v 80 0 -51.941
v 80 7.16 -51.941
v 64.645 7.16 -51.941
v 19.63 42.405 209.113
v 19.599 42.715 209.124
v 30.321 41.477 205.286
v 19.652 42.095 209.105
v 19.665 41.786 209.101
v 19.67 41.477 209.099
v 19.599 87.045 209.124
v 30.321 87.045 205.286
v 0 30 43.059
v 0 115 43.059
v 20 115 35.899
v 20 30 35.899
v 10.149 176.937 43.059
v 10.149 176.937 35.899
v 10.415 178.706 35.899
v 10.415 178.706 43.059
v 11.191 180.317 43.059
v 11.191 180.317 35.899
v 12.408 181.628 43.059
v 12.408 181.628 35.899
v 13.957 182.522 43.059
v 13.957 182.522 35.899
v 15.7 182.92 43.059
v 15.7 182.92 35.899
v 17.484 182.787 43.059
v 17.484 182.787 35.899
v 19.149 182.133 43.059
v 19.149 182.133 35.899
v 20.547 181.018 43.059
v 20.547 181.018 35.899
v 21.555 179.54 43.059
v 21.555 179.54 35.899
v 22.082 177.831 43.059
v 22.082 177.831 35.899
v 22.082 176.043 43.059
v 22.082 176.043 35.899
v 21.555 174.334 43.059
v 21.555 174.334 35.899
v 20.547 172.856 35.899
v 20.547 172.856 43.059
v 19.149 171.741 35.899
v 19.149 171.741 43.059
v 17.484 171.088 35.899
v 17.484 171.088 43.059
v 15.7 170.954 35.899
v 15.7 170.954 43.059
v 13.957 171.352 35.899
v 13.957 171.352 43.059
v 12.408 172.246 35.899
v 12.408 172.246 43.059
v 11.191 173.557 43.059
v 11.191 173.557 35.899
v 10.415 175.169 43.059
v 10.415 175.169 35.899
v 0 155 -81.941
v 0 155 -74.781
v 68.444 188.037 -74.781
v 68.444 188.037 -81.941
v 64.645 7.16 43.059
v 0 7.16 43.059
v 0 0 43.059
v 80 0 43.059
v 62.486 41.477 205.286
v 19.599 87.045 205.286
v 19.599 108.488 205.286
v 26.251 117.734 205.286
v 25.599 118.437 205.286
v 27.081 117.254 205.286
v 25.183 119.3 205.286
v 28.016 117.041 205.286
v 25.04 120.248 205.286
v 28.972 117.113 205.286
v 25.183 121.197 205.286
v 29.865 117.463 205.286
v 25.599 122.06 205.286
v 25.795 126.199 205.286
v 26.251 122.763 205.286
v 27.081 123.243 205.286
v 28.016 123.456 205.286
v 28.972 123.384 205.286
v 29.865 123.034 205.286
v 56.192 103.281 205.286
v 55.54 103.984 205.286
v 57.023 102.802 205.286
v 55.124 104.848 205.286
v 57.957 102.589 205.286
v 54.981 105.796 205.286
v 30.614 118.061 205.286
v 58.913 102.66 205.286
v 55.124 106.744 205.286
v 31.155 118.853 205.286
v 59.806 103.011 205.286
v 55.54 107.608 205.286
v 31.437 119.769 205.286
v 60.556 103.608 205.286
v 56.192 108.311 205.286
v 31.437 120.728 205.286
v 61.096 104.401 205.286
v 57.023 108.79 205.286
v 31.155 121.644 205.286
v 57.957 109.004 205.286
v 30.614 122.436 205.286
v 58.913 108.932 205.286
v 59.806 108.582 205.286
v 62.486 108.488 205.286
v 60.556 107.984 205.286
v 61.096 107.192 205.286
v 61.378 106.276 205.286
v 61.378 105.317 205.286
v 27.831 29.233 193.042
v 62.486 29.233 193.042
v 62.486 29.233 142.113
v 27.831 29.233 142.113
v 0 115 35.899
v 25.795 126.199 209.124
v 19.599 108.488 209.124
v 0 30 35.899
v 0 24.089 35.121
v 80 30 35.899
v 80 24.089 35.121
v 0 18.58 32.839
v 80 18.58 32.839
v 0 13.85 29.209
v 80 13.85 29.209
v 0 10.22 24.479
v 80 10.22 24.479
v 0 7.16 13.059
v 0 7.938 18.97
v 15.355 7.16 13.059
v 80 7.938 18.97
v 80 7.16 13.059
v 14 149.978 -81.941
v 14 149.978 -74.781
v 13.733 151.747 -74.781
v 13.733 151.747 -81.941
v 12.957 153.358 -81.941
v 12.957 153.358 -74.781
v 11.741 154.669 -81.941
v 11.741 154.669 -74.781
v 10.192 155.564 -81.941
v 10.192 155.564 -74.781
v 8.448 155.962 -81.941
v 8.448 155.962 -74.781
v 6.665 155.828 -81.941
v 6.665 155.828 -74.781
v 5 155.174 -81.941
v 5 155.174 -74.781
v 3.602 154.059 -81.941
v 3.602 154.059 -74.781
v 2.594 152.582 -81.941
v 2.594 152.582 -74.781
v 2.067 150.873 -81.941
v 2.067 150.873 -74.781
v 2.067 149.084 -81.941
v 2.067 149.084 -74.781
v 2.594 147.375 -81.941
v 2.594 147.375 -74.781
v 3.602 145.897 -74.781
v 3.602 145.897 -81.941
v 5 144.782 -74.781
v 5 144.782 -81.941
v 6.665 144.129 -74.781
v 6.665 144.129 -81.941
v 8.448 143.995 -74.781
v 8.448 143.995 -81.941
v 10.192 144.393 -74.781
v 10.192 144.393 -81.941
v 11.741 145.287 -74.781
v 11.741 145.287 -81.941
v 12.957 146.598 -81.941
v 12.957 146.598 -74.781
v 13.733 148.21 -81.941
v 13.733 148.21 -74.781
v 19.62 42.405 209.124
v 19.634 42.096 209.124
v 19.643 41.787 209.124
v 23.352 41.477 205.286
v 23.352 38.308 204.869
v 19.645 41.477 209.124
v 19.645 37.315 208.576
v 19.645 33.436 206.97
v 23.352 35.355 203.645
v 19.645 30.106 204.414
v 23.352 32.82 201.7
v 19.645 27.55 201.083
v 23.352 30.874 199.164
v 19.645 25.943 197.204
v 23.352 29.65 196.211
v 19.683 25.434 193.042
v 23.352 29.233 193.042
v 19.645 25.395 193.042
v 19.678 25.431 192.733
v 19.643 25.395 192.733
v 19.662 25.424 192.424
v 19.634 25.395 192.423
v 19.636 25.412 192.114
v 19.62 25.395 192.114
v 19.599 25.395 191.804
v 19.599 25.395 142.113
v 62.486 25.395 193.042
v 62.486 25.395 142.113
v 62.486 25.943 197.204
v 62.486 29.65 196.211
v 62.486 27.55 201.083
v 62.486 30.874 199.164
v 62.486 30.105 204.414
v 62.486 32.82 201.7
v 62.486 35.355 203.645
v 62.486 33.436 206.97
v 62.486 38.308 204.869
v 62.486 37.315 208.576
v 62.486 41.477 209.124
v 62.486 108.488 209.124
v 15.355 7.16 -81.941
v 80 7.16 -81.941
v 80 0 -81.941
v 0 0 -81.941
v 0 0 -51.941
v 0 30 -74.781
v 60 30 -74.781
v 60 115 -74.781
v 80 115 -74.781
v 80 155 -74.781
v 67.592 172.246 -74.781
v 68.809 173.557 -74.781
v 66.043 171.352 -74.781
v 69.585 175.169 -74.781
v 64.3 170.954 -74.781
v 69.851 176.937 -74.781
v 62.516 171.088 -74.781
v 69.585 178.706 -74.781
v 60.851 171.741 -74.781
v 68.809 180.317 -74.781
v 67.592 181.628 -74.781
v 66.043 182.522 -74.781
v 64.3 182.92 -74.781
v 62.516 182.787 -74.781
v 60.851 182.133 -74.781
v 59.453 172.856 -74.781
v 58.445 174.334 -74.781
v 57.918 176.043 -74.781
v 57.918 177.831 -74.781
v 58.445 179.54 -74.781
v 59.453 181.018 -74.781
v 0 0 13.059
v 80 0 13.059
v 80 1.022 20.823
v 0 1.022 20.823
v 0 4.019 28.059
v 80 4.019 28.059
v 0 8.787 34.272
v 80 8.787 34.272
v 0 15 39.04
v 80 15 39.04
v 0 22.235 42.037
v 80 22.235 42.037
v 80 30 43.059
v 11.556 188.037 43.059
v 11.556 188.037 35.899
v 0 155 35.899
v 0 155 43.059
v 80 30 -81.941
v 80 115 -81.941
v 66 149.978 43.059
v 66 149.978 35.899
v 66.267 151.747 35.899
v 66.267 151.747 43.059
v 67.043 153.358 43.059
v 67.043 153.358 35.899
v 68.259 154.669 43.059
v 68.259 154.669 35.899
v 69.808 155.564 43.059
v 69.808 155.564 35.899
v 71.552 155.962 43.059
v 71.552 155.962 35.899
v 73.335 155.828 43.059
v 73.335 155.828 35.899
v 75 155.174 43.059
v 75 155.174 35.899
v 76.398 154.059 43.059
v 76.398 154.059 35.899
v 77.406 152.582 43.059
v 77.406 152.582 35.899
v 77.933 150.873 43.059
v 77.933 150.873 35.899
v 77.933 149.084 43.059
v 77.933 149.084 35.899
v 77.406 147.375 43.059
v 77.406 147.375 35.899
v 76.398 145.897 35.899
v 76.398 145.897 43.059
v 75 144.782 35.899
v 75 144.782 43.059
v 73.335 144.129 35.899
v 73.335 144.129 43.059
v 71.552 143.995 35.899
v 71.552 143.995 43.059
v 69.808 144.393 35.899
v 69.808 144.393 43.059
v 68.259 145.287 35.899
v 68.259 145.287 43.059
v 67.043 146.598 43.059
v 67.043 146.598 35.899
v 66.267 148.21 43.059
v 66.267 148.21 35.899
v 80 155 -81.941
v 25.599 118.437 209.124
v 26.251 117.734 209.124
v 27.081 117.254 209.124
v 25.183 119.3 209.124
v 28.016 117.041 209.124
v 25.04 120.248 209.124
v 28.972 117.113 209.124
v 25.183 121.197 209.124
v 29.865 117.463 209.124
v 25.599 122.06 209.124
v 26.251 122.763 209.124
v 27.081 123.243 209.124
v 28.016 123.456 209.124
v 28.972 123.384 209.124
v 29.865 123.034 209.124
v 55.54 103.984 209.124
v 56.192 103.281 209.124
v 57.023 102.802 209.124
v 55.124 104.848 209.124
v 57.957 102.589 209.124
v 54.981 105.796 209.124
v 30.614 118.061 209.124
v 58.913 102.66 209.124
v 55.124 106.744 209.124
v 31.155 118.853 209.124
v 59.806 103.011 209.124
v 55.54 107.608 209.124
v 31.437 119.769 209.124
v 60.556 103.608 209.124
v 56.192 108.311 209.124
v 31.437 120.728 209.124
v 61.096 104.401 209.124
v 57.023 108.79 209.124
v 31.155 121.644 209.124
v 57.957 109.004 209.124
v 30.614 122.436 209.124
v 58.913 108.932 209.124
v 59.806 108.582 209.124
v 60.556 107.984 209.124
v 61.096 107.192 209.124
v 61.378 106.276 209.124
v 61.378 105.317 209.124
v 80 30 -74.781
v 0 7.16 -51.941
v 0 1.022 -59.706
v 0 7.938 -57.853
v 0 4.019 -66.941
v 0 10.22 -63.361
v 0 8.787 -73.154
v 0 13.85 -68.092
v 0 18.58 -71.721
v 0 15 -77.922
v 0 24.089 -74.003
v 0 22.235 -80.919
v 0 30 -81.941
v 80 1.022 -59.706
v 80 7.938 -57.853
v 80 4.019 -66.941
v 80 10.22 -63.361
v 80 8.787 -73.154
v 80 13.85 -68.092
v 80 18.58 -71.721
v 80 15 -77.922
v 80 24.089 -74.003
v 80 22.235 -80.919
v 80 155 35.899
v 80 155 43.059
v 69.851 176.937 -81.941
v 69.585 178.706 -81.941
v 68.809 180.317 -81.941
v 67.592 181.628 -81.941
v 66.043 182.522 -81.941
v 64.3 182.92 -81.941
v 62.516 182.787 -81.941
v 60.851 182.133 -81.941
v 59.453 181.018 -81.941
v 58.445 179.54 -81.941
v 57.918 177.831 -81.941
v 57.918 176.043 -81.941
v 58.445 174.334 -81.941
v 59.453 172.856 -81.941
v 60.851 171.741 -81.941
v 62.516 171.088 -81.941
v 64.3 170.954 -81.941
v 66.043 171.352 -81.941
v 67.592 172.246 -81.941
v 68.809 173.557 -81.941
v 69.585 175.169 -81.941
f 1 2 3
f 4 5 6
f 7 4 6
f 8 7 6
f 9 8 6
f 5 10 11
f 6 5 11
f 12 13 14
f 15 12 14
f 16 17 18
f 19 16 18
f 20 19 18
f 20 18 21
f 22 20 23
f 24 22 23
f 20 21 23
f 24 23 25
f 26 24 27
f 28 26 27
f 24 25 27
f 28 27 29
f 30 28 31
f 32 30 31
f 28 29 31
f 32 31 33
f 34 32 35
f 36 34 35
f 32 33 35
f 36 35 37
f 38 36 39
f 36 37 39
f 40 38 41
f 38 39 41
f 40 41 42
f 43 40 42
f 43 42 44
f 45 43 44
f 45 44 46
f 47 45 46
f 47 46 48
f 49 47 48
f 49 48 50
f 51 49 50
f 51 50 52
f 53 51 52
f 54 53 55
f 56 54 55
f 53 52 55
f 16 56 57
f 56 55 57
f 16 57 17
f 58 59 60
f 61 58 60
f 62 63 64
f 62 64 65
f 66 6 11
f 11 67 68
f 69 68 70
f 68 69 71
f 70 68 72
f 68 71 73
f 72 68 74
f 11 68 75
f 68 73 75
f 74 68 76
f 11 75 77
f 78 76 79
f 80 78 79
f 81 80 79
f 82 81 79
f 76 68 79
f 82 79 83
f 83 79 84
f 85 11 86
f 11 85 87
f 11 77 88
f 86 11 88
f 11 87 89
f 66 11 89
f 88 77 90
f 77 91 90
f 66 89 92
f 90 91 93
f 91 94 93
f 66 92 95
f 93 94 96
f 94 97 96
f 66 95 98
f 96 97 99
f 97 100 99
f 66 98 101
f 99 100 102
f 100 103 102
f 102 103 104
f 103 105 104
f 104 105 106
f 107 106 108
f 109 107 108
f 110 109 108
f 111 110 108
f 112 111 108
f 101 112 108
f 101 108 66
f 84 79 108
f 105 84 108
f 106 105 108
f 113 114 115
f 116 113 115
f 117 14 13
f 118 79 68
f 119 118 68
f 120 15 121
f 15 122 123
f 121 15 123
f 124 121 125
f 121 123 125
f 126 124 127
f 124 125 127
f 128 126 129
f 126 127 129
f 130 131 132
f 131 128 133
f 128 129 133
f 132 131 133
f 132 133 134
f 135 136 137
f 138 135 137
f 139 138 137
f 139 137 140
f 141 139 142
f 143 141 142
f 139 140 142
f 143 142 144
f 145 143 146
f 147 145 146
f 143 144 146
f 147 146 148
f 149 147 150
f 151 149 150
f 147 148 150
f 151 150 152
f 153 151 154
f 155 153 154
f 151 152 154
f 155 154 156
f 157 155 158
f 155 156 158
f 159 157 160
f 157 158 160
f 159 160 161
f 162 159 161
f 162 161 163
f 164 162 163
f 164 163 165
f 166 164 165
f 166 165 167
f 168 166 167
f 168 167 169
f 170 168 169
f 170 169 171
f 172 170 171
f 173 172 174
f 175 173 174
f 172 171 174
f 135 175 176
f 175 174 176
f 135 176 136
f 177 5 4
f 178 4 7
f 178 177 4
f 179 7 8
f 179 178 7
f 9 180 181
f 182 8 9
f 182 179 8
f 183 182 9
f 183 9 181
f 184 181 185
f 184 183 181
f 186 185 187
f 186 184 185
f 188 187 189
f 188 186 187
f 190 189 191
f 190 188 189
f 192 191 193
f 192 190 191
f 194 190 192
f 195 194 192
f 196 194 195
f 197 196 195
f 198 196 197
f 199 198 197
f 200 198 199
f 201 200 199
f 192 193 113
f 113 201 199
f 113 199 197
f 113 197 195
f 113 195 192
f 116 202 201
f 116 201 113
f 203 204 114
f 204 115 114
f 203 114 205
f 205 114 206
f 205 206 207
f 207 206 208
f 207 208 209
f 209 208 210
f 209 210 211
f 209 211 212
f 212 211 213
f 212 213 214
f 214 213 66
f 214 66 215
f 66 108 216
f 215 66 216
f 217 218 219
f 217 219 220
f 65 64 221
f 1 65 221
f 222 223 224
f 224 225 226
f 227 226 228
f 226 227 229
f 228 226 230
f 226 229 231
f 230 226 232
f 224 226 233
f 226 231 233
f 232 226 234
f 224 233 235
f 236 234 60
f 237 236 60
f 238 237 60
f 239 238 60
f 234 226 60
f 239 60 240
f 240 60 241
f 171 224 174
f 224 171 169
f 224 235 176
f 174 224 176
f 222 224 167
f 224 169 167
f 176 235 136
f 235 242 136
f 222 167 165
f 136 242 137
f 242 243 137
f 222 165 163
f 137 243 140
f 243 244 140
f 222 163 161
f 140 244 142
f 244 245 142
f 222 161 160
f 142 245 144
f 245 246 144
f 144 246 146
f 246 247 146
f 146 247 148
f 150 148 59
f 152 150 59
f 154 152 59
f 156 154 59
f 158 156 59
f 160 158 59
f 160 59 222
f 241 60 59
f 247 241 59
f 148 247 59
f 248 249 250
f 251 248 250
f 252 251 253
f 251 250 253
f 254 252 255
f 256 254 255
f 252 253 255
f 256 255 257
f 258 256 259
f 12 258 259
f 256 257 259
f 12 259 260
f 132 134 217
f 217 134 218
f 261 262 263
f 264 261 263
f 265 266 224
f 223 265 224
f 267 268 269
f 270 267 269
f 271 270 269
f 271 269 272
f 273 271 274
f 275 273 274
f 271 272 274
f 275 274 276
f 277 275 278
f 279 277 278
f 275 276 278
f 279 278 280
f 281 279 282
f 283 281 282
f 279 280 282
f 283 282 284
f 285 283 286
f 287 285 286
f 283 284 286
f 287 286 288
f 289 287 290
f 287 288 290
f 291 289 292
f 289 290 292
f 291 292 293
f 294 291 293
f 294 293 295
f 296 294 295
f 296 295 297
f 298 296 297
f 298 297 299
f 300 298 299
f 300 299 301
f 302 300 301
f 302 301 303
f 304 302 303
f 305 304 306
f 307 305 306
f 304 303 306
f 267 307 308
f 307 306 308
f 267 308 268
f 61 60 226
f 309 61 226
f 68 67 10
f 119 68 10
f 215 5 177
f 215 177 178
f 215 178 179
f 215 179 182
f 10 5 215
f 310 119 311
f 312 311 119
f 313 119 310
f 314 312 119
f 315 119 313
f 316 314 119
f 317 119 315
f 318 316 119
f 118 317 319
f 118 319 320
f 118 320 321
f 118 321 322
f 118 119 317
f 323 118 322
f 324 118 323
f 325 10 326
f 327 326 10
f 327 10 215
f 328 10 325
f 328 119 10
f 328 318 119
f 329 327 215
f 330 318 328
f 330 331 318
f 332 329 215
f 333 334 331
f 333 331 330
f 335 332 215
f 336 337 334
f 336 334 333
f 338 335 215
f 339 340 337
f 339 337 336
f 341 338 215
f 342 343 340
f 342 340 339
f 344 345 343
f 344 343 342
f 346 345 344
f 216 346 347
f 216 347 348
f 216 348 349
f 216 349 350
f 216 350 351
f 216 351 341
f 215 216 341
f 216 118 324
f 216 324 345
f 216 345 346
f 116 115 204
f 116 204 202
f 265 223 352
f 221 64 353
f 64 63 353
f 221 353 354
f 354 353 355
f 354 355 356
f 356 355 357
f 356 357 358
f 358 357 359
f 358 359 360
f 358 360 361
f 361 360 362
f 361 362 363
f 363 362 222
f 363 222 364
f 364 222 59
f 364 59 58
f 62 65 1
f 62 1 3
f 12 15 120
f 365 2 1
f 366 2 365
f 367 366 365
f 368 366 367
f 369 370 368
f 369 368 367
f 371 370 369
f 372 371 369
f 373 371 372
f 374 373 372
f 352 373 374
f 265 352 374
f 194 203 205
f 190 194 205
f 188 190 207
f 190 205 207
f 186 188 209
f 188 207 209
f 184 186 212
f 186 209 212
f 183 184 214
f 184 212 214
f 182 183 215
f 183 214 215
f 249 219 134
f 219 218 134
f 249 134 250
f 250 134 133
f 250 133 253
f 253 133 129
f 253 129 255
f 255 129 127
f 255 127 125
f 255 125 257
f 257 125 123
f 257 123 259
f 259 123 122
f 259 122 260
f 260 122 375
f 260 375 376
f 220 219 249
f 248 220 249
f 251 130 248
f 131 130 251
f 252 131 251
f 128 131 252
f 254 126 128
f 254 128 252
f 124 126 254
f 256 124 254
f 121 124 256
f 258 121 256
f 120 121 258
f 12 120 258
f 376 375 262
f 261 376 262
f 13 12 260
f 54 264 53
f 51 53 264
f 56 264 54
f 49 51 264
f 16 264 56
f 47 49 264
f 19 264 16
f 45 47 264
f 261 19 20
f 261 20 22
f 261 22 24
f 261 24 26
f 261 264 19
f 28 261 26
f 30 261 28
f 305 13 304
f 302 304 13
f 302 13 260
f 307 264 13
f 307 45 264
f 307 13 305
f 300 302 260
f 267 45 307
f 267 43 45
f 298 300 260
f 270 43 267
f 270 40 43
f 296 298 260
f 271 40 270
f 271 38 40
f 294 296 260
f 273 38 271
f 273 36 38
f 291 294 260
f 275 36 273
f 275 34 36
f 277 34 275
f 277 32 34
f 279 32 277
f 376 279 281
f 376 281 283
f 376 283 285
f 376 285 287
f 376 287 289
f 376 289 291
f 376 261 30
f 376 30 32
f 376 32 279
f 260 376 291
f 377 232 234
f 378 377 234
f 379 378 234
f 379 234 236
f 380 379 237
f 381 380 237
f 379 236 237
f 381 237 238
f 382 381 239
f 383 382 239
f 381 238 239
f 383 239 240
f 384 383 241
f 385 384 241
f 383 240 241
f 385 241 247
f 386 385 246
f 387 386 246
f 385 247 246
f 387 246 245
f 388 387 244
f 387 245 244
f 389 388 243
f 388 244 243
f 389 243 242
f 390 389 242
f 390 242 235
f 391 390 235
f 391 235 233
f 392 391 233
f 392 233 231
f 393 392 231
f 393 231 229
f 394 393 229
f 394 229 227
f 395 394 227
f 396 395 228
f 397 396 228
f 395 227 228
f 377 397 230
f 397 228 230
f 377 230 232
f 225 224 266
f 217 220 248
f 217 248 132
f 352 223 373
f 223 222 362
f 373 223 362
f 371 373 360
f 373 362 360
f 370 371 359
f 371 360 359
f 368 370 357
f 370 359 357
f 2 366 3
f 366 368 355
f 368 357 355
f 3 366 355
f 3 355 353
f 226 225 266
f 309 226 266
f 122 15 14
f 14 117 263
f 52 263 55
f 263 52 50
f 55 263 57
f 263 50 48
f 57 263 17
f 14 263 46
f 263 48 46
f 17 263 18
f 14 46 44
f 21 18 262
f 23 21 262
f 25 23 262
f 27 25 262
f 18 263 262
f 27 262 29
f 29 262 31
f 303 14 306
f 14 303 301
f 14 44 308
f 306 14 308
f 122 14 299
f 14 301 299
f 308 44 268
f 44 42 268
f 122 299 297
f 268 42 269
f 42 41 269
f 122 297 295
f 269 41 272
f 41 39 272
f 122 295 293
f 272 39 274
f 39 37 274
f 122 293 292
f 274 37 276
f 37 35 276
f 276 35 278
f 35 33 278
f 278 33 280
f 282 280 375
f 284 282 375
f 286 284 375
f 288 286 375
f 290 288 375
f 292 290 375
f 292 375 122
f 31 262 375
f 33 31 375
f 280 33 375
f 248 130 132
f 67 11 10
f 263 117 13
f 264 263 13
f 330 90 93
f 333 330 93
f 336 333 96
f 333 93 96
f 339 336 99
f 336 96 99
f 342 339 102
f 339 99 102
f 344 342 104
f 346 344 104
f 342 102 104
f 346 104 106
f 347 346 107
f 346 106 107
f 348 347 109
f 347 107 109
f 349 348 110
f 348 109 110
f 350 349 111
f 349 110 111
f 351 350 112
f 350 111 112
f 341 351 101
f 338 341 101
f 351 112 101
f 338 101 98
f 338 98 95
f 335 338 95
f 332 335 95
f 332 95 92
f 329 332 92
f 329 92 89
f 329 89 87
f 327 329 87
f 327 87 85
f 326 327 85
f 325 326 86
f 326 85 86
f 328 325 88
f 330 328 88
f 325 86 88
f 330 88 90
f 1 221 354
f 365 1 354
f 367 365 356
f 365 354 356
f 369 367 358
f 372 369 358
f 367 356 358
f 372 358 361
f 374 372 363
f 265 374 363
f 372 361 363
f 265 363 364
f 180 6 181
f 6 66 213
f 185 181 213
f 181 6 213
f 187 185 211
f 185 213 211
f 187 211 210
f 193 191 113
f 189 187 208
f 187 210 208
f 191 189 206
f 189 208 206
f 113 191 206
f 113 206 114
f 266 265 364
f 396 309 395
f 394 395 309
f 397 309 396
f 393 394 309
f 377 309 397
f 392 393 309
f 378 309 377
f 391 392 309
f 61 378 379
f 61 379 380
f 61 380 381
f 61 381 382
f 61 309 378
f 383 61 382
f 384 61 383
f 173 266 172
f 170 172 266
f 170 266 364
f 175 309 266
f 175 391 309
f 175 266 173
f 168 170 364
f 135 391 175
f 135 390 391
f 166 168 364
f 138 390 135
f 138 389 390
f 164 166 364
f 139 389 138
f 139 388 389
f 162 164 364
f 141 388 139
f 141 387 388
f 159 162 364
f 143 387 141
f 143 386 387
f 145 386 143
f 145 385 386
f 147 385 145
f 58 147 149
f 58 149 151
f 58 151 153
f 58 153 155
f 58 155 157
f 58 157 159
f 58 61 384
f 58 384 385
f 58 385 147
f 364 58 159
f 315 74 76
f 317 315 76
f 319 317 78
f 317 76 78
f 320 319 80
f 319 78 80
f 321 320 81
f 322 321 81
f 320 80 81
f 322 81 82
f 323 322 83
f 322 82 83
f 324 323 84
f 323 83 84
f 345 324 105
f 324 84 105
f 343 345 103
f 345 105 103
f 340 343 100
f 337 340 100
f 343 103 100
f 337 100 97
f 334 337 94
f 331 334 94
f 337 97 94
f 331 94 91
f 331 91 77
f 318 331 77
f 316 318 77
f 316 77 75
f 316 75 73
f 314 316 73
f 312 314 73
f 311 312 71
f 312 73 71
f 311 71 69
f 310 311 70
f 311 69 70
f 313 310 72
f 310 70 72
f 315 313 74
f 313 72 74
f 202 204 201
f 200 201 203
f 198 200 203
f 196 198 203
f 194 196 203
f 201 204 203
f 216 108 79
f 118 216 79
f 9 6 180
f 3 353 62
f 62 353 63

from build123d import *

# Parameters (mm, degrees)
BOSS_EXTRUDE1_DEPTH   = 80
BOSS_EXTRUDE2_DEPTH   = 7.16
SKETCH3_R             = 6
CUT_EXTRUDE1_DEPTH    = 7.16
CUT_EXTRUDE6_DEPTH    = 95
CUT_EXTRUDE7_DEPTH    = 85
BODY_MOVE_COPY5_ANGLE = 180
CHAMFER1_SIZE         = 7
CHAMFER1_SIZE_2       = 7.248712197
SCALE1_SCALE          = 0.714781685
SCALE2_SCALE          = 0.5
SCALE3_SCALE          = 1.5


with BuildPart() as part:
    # Sketch1 → Boss-Extrude1 (new body)
    with BuildSketch(Plane(origin=(0, 0, 0), x_dir=(0, 0, -1), z_dir=(1, 0, 0))):
        with BuildLine():
            Line((-43.05875576, 0), (51.94124424, 0))
            ThreePointArc((51.94124424, 0), (73.154447675, 8.786796564), (81.94124424, 30))
            Line((81.94124424, 30), (81.94124424, 155))
            Line((81.94124424, 155), (74.78124424, 155))
            Line((74.78124424, 155), (74.78124424, 30))
            ThreePointArc((74.78124424, 30), (68.091563122, 13.849681118), (51.94124424, 7.16))
            Line((51.94124424, 7.16), (-43.05875576, 7.16))
            Line((-43.05875576, 7.16), (-43.05875576, 0))
        make_face()
    extrude(amount=BOSS_EXTRUDE1_DEPTH)

    # Sketch2 → Boss-Extrude2 (add)
    with BuildSketch(Plane.XY.offset(-74.78124424)):
        Polygon((0, 155), (68.44375, 188.037147061), (80, 155), align=None)
    extrude(amount=-BOSS_EXTRUDE2_DEPTH)

    # Sketch3 → Cut-Extrude1 (cut)
    with BuildSketch(Plane.XY.offset(-74.78124424)):
        with Locations((63.851173507, 176.937147061)):
            Circle(SKETCH3_R)
        with Locations((8, 149.978316888)):
            Circle(SKETCH3_R)
    extrude(amount=-CUT_EXTRUDE1_DEPTH, mode=Mode.SUBTRACT)

    # Sketch6 → Cut-Extrude6 (cut)
    with BuildSketch(Plane.XY.offset(43.05875576)):
        Polygon((80, 0), (64.645330449, 7.16), (80, 7.16), align=None)
    extrude(amount=-CUT_EXTRUDE6_DEPTH, mode=Mode.SUBTRACT)

    # Sketch10 → Cut-Extrude7 (cut)
    with BuildSketch(Plane(origin=(0, 115, 0), x_dir=(-1, 0, 0), z_dir=(0, -1, 0))):
        Polygon((-80, 81.94124424), (-60, 74.78124424), (-80, 74.78124424), align=None)
    extrude(amount=CUT_EXTRUDE7_DEPTH, mode=Mode.SUBTRACT)


with BuildPart() as body_2:
    # Body-Move/Copy5: copy of part
    add(part.part.rotate(Axis((40, 0, -19.44124424), (0, 1, 0)), BODY_MOVE_COPY5_ANGLE))


with BuildPart() as body_3:
    # Body-Move/Copy6: copy of body 2
    add(body_2.part.moved(Location((0, 0, 180))))

    # Chamfer1
    # the kernel refuses this chamfer: 7.248712197, 7 mm, written as the material it takes off along each edge
    with BuildSketch(Plane(origin=(0, 30, 193.05875576), x_dir=(-4.3395359515607355e-15, 0.7290125666970131, 0.684500312343123), z_dir=(4.621730896647766e-15, 0.684500312343123, -0.7290125666970131))) as chamfer1_piece_1:
        Polygon((22.84, CHAMFER1_SIZE), (22.84 + CHAMFER1_SIZE_2, 0), (22.84, 0), align=None)
    revolve(axis=Axis((0, 30, 193.05875576), (1, 0, 0)), revolution_arc=183.607355582, mode=Mode.SUBTRACT)


with BuildPart() as body_3_1:
    # Scale1: scaled about (42.248049125, 54.740546913, 193.021894029)
    add(body_3.part.scale(SCALE1_SCALE).moved(Location((12.049917373, 15.613006539, 55.053379325))))


with BuildPart() as body_3_2:
    # Scale2: scaled about (42.248049125, 54.740546913, 193.021894029)
    add(body_3_1.part.scale(SCALE2_SCALE).moved(Location((21.124024563, 27.370273457, 96.510947015))))


with BuildPart() as body_3_3:
    # Scale3: scaled about (42.248049125, 54.740546913, 193.021894029)
    add(body_3_2.part.scale(SCALE3_SCALE).moved(Location((-21.124024563, -27.370273457, -96.510947015))))


solid = Compound([part.part, body_2.part, body_3_3.part])
